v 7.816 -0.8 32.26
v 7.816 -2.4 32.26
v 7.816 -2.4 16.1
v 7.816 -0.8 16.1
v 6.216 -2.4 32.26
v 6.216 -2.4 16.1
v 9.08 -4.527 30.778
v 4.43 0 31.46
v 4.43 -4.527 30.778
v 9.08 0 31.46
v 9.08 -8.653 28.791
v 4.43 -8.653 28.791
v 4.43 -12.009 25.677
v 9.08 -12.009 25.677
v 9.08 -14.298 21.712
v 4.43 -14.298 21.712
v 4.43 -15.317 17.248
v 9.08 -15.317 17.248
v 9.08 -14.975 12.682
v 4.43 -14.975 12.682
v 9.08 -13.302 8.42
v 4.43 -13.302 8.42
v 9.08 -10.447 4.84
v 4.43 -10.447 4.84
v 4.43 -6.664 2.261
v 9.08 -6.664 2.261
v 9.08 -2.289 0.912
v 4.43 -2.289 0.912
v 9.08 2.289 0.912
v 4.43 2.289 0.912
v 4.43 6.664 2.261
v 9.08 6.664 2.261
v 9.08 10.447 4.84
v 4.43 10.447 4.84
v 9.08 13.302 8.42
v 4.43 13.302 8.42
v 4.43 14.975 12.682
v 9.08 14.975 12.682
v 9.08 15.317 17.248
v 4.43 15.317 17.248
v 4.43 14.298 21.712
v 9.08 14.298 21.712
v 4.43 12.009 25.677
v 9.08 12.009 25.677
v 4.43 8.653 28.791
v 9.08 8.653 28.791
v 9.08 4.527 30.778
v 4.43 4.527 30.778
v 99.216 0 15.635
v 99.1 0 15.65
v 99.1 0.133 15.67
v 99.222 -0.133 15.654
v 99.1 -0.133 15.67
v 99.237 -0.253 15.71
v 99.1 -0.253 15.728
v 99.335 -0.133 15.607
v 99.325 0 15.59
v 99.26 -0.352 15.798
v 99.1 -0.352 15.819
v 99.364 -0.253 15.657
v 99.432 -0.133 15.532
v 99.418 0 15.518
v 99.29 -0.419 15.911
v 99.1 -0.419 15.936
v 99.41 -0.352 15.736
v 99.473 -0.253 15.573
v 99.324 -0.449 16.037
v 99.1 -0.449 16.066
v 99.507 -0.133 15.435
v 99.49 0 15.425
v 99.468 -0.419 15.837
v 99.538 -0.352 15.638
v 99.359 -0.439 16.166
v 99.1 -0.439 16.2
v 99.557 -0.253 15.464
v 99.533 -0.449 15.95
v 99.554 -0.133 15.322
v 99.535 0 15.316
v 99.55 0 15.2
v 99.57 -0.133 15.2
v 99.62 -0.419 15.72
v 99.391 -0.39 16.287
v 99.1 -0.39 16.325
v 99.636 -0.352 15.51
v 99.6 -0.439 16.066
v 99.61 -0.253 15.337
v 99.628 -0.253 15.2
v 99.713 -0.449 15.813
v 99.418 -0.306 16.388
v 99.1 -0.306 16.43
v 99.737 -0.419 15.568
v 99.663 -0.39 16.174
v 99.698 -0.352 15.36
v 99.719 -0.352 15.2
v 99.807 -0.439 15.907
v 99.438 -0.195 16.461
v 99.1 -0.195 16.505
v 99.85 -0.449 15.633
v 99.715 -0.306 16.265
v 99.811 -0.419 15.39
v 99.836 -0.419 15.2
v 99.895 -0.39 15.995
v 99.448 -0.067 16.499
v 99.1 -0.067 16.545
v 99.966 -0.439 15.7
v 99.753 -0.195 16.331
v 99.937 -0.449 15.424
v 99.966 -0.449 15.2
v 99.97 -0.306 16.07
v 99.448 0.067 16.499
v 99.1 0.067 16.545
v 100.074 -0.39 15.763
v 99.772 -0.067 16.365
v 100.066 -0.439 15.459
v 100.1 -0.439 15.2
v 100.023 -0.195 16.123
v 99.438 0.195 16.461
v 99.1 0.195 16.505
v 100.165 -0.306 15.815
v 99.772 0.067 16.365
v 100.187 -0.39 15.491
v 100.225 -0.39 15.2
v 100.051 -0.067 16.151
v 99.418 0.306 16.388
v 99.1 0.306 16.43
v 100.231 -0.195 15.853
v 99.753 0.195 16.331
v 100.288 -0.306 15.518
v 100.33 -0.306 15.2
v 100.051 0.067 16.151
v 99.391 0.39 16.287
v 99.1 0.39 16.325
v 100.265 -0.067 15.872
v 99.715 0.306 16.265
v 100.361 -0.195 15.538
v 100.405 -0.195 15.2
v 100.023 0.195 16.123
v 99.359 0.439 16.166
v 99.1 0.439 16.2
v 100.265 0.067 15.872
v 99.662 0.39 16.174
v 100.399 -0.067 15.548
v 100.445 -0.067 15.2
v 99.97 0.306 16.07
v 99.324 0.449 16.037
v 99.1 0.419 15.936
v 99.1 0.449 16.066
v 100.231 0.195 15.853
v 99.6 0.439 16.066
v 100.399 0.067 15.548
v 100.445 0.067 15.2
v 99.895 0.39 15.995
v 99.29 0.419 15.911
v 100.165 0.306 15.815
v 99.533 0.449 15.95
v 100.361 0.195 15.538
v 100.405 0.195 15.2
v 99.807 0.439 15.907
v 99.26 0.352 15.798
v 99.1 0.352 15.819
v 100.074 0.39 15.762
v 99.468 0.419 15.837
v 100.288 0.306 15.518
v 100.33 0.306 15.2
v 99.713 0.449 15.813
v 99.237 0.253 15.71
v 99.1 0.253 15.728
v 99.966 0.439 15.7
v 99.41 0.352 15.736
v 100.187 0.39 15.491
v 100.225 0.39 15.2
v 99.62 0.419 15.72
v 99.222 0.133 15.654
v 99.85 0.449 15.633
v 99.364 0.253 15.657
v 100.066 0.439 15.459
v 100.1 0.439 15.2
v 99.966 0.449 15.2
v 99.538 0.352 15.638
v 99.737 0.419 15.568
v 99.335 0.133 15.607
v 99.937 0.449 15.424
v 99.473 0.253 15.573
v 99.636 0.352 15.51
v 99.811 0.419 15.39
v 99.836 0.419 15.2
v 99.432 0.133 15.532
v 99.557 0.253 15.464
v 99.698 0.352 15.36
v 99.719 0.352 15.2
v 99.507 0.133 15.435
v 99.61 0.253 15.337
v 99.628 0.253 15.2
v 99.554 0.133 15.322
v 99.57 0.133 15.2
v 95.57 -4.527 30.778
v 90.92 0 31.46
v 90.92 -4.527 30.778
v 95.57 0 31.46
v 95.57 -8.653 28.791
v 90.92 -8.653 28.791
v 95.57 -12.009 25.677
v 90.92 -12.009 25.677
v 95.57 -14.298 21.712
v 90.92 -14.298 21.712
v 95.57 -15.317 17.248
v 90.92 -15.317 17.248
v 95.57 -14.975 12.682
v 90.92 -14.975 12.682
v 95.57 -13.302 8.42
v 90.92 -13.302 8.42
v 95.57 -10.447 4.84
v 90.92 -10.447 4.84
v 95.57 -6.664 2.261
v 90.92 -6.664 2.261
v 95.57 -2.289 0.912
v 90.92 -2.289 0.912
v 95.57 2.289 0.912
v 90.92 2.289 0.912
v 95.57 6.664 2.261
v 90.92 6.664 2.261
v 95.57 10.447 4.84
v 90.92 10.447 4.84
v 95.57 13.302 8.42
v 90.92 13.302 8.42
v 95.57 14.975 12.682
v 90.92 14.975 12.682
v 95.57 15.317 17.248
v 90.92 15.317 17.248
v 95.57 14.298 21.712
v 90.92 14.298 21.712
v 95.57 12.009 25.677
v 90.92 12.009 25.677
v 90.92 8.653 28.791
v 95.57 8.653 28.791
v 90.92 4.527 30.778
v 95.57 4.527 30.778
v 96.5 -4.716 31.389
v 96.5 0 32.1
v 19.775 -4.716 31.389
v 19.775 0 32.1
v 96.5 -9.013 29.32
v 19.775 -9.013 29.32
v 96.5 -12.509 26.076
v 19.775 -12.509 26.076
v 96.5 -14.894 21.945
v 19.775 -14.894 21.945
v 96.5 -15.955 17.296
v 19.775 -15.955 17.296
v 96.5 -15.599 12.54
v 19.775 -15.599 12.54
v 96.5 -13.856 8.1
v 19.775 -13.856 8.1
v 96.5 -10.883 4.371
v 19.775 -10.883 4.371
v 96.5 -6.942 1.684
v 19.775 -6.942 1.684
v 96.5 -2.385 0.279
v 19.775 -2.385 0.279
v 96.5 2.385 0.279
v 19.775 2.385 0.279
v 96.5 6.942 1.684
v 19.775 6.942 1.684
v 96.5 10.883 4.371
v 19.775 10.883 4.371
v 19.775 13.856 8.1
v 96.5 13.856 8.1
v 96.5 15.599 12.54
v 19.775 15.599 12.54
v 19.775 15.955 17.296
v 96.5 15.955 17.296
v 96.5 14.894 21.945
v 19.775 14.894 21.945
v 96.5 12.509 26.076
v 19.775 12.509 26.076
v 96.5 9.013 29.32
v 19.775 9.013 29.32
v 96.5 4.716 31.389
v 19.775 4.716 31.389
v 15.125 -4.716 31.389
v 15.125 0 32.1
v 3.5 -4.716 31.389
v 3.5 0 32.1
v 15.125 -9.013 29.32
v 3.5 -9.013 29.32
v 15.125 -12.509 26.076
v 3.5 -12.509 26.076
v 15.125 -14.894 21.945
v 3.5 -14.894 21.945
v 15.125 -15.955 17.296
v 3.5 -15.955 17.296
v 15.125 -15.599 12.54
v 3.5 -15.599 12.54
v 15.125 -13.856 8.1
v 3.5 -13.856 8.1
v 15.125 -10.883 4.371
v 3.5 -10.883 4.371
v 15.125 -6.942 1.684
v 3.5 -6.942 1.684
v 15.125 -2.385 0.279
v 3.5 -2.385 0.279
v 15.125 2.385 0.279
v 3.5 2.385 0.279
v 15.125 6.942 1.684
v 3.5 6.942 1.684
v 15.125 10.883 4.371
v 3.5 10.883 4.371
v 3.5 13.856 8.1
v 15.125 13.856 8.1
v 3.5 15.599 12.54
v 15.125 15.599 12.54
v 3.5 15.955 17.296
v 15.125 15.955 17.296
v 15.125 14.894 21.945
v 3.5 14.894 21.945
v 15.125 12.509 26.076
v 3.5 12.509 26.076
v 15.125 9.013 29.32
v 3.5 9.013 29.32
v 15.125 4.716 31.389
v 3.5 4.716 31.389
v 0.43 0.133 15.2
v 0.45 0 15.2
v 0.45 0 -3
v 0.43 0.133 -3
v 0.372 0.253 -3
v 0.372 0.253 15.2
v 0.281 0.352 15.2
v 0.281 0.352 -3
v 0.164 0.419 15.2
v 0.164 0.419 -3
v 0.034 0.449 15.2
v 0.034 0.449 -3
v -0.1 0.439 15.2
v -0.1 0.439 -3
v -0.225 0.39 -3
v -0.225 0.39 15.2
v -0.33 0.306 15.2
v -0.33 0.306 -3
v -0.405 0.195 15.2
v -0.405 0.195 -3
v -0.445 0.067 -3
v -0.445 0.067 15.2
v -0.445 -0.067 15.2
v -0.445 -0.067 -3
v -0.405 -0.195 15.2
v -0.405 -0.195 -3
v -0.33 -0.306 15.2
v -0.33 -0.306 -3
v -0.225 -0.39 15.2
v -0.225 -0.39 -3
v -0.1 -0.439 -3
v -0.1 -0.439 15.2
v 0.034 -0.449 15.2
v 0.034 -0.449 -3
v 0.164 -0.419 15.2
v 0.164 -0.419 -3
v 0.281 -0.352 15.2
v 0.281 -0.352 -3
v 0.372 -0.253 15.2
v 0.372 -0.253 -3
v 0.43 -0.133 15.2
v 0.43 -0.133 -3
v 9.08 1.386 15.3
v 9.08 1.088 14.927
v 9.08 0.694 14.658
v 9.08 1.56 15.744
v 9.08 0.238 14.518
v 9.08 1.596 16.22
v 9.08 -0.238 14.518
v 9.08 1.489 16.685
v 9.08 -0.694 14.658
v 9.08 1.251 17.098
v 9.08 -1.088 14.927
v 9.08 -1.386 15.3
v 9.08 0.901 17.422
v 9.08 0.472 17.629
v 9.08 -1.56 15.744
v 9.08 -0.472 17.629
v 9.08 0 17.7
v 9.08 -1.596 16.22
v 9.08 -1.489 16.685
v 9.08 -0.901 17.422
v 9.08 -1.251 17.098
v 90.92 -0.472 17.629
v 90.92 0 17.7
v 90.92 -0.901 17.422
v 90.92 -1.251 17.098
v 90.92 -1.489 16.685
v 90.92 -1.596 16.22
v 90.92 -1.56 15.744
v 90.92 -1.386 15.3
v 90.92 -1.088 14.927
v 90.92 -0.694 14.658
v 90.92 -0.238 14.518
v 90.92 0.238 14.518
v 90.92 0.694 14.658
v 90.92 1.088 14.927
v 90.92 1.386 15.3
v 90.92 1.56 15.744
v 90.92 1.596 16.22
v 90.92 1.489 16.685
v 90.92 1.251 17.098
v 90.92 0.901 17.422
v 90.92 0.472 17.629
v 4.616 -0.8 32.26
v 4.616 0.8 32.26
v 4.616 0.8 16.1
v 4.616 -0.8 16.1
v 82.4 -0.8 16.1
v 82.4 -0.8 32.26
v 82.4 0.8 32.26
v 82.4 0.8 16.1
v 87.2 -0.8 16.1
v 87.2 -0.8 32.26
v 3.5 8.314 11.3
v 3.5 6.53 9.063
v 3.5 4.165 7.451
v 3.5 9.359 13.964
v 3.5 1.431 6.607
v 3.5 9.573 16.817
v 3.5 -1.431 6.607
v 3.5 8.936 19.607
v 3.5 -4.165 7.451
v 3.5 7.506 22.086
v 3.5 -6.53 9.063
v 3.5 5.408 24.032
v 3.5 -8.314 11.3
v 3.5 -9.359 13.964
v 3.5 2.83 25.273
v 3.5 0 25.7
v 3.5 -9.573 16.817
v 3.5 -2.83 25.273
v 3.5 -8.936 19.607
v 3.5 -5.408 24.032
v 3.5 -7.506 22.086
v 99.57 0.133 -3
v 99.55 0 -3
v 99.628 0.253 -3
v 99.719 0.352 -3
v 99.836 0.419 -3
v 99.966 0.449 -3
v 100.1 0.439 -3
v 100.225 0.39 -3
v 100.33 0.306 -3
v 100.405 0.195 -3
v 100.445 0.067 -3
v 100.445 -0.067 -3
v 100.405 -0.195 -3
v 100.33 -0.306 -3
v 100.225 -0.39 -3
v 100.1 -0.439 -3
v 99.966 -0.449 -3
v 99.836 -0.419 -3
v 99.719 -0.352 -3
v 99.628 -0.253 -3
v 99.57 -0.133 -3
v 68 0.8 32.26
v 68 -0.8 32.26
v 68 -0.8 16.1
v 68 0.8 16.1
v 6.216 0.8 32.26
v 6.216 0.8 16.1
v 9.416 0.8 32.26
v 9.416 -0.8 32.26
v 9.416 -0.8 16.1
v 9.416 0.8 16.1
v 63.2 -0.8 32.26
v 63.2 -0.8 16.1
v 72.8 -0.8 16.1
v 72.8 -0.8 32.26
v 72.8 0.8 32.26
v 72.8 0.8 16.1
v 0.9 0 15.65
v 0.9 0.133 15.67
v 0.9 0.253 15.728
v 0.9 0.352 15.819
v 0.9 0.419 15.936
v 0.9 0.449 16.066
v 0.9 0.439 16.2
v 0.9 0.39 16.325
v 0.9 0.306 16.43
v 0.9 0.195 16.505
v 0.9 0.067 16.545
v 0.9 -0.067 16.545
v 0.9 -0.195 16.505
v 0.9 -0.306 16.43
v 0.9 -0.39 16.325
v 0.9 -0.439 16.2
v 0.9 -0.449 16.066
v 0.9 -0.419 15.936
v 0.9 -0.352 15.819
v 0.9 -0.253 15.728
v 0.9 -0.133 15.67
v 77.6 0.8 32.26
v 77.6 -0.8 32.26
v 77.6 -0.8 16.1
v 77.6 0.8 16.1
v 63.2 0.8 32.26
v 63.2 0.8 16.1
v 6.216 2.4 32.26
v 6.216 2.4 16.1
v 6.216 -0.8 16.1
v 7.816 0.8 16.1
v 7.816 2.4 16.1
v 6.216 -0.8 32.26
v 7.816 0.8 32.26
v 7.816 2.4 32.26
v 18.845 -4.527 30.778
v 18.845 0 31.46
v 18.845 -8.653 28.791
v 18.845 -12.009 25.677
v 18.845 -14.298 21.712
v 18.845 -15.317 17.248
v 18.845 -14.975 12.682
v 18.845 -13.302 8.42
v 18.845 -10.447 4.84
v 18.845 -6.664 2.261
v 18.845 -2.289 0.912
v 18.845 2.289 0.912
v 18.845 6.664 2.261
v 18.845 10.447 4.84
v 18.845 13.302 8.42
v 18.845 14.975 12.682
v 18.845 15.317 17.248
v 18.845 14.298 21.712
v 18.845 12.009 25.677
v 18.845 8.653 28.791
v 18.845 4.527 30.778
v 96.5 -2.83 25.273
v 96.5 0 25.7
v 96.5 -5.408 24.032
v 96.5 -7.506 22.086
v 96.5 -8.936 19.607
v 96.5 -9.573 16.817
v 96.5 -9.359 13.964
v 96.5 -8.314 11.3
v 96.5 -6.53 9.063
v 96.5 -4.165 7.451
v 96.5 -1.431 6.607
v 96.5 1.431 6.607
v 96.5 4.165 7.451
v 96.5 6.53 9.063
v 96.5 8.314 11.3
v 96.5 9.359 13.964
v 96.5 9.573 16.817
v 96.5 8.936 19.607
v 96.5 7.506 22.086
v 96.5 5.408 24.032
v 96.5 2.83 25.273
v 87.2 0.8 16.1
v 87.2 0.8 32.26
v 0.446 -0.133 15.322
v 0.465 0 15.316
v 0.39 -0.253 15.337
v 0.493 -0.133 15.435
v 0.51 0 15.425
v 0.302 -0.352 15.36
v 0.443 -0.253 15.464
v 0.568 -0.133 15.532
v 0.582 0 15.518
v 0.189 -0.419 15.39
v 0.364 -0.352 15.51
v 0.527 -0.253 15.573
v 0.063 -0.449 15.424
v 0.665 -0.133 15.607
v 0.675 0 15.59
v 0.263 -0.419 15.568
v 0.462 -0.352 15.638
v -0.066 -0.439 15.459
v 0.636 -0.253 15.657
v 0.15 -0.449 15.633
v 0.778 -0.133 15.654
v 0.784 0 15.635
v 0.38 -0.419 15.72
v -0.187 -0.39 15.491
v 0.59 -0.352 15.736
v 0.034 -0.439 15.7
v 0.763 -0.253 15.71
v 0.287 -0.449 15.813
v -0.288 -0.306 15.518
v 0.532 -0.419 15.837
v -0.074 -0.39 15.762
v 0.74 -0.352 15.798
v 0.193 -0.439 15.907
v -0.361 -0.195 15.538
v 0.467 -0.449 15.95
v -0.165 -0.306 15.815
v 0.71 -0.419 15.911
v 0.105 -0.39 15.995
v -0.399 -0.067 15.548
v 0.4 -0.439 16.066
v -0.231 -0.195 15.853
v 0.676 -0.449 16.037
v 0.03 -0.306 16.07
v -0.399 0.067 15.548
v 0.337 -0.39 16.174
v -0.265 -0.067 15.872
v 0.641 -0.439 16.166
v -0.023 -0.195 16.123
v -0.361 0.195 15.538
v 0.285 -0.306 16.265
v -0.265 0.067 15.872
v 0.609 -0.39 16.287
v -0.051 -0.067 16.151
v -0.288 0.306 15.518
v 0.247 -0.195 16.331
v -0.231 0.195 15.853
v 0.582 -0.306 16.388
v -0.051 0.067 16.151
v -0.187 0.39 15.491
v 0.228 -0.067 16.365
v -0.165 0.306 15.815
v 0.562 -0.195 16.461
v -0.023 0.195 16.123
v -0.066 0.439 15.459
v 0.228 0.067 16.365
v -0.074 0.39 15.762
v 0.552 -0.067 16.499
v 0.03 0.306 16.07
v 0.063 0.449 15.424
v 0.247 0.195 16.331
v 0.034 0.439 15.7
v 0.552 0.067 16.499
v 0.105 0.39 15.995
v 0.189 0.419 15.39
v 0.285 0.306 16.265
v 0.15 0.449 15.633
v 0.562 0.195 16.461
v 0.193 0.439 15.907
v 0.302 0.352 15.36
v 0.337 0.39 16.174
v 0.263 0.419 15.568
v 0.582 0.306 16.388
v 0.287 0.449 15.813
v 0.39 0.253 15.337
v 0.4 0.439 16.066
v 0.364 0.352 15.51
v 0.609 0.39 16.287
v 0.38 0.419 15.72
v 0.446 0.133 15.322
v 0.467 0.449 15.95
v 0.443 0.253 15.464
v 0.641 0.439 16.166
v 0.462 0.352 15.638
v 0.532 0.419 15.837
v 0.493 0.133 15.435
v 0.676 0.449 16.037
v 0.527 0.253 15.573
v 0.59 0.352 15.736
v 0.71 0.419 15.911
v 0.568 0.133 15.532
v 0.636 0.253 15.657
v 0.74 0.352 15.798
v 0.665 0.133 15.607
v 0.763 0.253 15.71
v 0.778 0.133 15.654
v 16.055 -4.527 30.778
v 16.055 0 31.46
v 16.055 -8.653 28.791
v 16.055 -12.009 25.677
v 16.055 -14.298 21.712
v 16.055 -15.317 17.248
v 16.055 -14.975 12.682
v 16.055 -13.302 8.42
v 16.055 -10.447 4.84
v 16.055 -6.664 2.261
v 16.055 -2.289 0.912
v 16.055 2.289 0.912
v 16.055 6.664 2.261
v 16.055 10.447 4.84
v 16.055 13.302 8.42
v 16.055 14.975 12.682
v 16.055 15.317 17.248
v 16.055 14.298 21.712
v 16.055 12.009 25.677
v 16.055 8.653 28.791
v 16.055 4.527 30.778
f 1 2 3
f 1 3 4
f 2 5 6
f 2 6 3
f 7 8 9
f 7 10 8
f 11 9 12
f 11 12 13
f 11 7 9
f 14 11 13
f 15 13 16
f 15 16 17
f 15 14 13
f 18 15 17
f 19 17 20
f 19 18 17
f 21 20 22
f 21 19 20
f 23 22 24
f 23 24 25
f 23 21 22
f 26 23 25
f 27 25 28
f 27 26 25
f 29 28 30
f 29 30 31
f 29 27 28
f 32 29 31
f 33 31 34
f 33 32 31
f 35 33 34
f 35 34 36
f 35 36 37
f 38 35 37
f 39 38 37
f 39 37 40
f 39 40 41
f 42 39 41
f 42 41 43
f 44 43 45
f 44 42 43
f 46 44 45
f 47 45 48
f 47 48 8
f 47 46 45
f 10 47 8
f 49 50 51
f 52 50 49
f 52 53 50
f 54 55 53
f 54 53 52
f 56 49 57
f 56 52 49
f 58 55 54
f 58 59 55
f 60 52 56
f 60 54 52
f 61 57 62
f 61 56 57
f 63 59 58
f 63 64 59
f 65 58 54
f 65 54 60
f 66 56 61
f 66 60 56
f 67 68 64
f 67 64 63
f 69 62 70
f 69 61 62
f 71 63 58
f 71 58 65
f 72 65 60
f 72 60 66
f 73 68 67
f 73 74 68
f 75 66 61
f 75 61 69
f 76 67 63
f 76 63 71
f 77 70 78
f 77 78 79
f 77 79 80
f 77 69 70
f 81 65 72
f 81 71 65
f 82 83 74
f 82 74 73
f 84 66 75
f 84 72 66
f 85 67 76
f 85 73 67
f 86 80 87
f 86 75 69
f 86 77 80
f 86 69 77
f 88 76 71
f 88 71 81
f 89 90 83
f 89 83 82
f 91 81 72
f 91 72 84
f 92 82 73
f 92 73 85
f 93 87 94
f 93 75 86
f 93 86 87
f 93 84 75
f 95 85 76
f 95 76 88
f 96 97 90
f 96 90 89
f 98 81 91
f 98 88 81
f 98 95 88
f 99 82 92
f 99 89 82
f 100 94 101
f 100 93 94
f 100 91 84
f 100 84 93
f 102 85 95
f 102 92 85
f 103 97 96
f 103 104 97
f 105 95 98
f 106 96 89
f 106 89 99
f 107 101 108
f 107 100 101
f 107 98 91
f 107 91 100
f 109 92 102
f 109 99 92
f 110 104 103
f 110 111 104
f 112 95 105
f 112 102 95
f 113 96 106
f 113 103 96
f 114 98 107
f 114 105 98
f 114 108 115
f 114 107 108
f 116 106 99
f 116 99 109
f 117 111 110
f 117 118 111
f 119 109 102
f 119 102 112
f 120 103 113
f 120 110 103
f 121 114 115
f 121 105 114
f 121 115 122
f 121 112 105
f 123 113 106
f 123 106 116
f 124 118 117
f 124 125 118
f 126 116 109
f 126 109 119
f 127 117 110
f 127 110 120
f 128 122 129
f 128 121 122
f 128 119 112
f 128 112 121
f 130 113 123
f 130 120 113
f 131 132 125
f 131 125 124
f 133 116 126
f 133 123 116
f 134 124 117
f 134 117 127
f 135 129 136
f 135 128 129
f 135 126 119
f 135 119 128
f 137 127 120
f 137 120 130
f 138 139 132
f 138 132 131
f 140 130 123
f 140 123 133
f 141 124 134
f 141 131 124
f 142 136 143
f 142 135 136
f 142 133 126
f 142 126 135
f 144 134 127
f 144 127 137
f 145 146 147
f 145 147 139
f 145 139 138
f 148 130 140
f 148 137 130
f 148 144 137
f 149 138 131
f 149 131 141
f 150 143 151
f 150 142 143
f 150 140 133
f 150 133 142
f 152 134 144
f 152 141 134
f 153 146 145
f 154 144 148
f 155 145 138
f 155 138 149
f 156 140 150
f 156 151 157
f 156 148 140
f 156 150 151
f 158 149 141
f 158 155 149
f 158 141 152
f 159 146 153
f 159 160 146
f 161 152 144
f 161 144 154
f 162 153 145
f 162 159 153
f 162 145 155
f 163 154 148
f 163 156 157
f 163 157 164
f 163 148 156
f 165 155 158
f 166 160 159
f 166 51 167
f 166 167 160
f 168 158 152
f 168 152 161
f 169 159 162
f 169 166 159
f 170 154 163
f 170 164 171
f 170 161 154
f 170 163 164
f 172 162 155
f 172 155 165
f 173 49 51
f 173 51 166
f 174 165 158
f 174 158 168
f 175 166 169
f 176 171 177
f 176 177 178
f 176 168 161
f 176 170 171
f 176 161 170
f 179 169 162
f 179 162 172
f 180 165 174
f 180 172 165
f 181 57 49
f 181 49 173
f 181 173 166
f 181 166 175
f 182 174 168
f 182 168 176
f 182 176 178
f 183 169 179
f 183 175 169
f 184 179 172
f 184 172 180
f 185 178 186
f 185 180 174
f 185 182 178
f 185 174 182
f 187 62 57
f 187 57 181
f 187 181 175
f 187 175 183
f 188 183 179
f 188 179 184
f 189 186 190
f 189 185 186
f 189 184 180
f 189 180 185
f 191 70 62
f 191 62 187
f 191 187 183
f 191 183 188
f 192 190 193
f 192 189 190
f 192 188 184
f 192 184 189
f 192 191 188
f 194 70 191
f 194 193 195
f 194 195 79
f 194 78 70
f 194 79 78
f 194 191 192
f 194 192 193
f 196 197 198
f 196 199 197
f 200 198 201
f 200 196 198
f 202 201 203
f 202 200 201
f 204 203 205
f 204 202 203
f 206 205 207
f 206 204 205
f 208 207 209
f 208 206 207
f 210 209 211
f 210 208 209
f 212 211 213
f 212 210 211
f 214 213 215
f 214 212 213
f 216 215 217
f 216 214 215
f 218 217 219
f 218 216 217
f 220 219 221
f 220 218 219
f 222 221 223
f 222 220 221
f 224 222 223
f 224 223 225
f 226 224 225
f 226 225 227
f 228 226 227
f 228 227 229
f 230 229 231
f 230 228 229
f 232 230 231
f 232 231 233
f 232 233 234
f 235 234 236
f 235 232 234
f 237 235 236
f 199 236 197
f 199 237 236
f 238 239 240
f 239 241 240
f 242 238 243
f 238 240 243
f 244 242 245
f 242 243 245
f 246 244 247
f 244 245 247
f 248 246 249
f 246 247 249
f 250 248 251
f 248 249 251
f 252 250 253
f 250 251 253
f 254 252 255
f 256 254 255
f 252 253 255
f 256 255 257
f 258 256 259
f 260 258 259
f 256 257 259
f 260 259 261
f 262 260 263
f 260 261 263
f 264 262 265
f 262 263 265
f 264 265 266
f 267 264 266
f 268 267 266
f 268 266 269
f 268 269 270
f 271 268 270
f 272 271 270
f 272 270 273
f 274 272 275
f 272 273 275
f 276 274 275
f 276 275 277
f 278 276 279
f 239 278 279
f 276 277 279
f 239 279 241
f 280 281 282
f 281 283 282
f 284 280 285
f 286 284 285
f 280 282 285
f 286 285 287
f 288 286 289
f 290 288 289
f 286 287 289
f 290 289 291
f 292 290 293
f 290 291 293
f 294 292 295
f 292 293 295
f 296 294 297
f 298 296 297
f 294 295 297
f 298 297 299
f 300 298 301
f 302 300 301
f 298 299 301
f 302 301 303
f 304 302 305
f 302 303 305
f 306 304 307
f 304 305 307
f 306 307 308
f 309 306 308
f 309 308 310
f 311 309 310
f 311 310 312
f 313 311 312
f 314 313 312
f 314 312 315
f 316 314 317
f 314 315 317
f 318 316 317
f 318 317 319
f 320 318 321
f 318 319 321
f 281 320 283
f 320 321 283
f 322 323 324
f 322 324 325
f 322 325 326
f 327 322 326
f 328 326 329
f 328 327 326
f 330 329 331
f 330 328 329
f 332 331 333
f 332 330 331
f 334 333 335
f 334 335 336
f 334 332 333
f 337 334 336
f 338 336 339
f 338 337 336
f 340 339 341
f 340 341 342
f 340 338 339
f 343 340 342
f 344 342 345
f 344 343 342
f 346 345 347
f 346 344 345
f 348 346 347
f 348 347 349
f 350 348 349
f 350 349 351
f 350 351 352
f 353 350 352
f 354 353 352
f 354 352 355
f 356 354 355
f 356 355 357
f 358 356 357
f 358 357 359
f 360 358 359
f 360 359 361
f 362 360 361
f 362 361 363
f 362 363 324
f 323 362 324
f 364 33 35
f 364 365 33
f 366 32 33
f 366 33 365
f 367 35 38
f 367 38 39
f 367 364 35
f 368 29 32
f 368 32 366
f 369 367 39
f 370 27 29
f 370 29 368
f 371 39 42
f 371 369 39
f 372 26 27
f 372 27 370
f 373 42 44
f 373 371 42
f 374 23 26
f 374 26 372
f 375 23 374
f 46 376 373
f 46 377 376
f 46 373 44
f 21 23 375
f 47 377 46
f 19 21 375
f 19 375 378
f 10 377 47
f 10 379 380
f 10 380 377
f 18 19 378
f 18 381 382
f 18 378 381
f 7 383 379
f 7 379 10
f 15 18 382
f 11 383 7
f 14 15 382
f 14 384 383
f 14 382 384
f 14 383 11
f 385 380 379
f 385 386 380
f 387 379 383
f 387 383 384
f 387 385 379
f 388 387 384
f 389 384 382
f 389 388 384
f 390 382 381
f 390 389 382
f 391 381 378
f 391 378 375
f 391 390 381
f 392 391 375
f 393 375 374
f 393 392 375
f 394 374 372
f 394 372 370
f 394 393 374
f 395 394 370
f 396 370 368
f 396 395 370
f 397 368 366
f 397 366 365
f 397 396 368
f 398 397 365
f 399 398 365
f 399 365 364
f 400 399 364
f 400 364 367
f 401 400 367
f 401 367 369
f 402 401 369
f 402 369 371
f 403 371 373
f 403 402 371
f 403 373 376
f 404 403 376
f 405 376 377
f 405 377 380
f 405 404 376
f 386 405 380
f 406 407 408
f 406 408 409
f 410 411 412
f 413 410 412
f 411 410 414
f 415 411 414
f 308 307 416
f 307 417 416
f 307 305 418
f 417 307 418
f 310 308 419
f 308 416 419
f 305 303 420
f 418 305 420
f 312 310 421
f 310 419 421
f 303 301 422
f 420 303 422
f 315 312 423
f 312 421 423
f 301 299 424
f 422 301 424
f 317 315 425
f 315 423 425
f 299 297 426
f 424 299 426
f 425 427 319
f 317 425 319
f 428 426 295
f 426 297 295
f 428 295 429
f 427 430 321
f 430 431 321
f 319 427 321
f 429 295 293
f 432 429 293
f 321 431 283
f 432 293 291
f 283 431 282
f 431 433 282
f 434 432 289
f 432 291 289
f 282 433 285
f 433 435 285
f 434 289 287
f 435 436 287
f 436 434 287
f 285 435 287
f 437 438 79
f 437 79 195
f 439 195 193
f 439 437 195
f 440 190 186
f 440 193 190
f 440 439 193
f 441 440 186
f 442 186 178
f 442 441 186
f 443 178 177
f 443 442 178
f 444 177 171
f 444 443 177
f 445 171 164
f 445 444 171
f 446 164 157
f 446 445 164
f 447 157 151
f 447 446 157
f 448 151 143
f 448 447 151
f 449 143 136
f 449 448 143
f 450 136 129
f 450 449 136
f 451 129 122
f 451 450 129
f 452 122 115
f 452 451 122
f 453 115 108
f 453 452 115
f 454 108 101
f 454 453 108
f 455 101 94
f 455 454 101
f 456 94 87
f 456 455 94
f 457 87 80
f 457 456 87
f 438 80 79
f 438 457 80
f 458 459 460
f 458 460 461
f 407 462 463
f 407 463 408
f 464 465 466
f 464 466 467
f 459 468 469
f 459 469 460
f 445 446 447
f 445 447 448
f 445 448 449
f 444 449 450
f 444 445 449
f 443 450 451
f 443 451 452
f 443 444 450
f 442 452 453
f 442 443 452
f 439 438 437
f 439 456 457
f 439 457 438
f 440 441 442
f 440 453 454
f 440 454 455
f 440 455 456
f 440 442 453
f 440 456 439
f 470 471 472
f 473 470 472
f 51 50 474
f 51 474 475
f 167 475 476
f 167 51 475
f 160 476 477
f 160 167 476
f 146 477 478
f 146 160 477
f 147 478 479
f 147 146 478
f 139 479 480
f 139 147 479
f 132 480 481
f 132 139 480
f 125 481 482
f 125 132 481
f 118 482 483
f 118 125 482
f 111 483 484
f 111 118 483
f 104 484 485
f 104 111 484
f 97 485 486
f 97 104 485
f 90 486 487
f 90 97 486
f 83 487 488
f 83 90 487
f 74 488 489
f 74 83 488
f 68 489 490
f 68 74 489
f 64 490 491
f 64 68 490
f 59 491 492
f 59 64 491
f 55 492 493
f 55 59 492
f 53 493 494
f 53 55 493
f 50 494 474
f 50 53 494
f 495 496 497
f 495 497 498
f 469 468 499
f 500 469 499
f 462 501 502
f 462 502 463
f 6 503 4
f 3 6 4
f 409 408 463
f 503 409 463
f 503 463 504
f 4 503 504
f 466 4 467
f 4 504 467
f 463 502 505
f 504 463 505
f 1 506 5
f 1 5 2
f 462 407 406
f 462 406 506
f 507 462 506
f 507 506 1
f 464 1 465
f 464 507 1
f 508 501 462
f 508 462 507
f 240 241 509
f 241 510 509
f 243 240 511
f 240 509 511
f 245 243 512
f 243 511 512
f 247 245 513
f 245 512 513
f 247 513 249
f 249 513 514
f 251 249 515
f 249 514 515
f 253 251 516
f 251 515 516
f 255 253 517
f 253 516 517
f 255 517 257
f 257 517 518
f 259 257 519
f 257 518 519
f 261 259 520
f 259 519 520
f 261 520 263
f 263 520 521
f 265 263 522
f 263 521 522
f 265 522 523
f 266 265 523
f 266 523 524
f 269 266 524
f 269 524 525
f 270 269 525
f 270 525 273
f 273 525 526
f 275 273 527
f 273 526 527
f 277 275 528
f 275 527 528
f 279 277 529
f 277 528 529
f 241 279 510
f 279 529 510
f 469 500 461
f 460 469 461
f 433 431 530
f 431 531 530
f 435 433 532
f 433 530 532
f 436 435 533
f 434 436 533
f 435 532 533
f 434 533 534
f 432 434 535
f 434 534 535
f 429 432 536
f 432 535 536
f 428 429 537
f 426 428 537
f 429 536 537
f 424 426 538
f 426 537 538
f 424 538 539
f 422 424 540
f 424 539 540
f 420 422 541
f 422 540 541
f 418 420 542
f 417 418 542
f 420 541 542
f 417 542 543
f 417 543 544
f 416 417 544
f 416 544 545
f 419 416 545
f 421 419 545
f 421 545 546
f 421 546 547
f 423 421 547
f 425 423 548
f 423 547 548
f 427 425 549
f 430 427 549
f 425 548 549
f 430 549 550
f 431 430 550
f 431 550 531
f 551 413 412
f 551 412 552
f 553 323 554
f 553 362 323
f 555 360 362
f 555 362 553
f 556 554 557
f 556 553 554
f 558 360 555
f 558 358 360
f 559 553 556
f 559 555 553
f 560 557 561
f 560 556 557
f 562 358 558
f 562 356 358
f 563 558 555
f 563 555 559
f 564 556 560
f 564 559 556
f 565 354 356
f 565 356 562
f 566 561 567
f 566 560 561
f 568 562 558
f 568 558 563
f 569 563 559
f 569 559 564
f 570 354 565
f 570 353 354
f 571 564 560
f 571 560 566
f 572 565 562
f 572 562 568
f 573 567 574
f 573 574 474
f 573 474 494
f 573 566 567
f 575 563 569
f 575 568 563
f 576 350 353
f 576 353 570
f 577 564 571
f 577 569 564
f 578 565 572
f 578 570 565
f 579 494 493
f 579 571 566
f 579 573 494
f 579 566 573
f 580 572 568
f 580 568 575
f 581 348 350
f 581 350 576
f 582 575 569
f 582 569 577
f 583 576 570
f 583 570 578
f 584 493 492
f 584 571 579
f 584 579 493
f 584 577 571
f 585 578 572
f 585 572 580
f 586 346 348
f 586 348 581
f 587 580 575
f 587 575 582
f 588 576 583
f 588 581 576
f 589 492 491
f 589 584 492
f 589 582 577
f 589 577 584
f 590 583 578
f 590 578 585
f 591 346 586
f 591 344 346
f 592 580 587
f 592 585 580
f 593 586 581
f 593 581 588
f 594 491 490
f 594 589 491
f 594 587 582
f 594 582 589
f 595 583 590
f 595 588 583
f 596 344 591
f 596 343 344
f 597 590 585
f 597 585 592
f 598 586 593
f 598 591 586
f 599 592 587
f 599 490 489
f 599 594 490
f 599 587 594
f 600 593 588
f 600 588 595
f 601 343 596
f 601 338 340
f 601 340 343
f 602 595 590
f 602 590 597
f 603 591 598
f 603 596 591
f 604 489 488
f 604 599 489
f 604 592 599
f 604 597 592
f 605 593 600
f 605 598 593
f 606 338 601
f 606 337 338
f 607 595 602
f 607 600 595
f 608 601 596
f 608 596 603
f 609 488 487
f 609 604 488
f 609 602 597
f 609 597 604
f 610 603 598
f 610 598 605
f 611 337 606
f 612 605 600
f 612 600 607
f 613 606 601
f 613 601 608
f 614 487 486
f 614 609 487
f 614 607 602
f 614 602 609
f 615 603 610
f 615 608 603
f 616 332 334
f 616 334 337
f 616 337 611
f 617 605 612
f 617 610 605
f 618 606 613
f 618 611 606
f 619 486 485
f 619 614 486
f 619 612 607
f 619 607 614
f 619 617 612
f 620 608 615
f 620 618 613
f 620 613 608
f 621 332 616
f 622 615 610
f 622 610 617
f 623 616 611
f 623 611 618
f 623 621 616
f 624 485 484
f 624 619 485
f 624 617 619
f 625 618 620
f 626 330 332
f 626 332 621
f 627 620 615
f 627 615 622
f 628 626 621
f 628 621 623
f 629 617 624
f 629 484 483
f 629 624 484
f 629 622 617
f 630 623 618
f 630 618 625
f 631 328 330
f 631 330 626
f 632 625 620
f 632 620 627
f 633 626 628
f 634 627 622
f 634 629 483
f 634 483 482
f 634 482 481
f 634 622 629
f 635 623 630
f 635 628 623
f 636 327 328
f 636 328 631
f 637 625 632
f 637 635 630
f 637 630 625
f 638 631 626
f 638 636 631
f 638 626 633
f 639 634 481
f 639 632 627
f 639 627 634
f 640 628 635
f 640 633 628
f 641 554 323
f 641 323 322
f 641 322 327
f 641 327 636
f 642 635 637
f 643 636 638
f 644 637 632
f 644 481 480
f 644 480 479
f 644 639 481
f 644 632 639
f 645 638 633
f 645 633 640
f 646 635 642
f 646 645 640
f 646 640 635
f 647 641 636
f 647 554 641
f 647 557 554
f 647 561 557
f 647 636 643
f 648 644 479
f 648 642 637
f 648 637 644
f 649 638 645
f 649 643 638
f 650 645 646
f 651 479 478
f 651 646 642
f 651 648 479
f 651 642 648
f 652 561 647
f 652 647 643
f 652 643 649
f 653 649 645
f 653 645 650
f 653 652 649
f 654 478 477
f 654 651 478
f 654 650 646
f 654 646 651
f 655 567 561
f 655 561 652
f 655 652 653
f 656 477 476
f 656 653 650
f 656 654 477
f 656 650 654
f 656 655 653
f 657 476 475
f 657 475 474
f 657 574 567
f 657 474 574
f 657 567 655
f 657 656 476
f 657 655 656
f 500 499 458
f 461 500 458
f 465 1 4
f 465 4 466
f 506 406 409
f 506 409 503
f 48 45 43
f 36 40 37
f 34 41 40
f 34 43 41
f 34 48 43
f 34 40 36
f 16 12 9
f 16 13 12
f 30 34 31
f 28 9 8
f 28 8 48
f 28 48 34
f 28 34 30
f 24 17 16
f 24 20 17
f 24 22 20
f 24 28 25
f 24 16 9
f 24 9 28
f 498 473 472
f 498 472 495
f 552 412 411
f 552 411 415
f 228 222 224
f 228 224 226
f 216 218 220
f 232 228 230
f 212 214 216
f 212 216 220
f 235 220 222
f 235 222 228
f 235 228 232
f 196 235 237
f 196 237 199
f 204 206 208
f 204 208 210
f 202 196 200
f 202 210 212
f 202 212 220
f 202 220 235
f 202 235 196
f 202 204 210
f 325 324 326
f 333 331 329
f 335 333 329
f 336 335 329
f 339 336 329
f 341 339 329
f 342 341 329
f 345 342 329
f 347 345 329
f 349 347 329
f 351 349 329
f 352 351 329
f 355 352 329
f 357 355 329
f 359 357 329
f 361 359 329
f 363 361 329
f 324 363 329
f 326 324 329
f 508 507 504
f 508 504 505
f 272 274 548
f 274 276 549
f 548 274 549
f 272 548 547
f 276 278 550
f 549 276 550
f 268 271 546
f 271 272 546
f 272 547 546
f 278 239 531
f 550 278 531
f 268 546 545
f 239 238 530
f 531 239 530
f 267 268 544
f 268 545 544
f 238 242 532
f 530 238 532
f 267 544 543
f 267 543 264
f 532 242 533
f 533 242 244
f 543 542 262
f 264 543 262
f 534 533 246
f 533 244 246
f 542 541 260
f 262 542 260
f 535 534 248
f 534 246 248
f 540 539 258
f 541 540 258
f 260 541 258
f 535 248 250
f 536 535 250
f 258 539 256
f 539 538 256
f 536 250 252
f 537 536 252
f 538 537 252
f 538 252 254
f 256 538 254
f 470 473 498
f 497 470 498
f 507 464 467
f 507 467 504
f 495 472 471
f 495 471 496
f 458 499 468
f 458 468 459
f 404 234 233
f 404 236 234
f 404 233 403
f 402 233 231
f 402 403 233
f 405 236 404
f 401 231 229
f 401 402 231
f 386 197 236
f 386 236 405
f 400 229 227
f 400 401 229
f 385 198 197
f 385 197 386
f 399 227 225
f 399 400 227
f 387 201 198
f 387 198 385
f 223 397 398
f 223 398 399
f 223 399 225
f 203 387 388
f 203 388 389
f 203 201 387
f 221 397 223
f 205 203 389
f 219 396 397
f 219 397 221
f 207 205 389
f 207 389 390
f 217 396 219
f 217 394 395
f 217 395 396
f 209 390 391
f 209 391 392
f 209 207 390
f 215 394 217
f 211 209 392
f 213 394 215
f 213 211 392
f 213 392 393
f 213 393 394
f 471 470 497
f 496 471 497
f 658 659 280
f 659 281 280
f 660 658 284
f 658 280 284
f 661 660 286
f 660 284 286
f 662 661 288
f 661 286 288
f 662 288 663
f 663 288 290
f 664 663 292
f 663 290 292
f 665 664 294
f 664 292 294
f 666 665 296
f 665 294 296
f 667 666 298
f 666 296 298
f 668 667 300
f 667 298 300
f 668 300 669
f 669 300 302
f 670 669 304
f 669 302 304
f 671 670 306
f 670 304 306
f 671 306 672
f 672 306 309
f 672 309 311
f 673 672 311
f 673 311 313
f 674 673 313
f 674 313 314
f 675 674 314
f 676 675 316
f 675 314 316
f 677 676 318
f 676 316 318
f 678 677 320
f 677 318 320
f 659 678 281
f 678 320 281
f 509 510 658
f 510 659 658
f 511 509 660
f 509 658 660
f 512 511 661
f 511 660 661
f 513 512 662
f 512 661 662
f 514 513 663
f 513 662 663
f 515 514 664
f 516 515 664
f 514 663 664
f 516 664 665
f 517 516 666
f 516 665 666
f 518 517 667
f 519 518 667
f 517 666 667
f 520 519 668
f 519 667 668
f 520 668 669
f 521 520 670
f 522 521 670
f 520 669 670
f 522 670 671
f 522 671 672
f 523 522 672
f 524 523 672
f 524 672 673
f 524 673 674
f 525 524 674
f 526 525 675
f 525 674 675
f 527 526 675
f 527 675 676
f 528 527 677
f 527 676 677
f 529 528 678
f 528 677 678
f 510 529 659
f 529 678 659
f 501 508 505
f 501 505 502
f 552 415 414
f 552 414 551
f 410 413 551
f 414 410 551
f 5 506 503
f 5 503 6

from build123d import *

# Parameters (mm, degrees)
SKETCH_R    = 0.45
SKETCH004_W = 4.8
SKETCH004_H = 1.6
PAD_DEPTH   = 16.16


with BuildPart() as sweep_body:
    # Sweep: sweep along a path in Sketch001
    with BuildLine(Plane.XZ) as sweep_path:
        Line((0, -3), (0, 15.2))
        ThreePointArc((0, 15.2), (0.263601, 15.836393), (0.899993, 16.1))
        Line((0.899993, 16.1), (99.1, 16.1))
        ThreePointArc((99.1, 16.1), (99.736396, 15.836396), (100, 15.2))
        Line((100, 15.2), (100, -3))
    # Sketch → Sweep (sweep)
    with BuildSketch(Plane.XY.offset(-2)):
        Circle(SKETCH_R)
    sweep(path=sweep_path.line)


with BuildPart() as revolution:
    # Sketch002 → Revolution (revolve)
    with BuildSketch(Plane.XZ):
        Polygon((3.5, 32.1), (3.5, 25.7), (96.5, 25.7), (96.5, 32.1), (19.775, 32.1), (18.845, 31.46), (16.055, 31.46), (15.125, 32.1), align=None)
    revolve(axis=Axis((6.97588, 0, 16.1), (1, 0, 0)))


with BuildPart() as revolution001:
    # Sketch003 → Revolution001 (revolve)
    with BuildSketch(Plane.XZ):
        Polygon((4.43, 31.46), (9.08, 31.46), (9.08, 17.7), (90.92, 17.7), (90.92, 31.46), (95.57, 31.46), (95.57, 16.1), (4.43, 16.1), align=None)
    revolve(axis=Axis((6.97588, 0, 16.1), (1, 0, 0)))


with BuildPart() as pad:
    # Sketch004 → Pad (new body)
    with BuildSketch(Plane.XY.offset(16.1)):
        with Locations((84.8, 0)):
            Rectangle(SKETCH004_W, SKETCH004_H)
        with Locations((75.2, 0)):
            Rectangle(SKETCH004_W, SKETCH004_H)
        with Locations((65.6, 0)):
            Rectangle(SKETCH004_W, SKETCH004_H)
        Polygon((6.216, 0.8), (4.616, 0.8), (4.616, -0.8), (6.216, -0.8), (6.216, -2.4), (7.816, -2.4), (7.816, -0.8), (9.416, -0.8), (9.416, 0.8), (7.816, 0.8), (7.816, 2.4), (6.216, 2.4), align=None)
    extrude(amount=PAD_DEPTH)


solid = Compound([sweep_body.part, revolution.part, revolution001.part, pad.part])
